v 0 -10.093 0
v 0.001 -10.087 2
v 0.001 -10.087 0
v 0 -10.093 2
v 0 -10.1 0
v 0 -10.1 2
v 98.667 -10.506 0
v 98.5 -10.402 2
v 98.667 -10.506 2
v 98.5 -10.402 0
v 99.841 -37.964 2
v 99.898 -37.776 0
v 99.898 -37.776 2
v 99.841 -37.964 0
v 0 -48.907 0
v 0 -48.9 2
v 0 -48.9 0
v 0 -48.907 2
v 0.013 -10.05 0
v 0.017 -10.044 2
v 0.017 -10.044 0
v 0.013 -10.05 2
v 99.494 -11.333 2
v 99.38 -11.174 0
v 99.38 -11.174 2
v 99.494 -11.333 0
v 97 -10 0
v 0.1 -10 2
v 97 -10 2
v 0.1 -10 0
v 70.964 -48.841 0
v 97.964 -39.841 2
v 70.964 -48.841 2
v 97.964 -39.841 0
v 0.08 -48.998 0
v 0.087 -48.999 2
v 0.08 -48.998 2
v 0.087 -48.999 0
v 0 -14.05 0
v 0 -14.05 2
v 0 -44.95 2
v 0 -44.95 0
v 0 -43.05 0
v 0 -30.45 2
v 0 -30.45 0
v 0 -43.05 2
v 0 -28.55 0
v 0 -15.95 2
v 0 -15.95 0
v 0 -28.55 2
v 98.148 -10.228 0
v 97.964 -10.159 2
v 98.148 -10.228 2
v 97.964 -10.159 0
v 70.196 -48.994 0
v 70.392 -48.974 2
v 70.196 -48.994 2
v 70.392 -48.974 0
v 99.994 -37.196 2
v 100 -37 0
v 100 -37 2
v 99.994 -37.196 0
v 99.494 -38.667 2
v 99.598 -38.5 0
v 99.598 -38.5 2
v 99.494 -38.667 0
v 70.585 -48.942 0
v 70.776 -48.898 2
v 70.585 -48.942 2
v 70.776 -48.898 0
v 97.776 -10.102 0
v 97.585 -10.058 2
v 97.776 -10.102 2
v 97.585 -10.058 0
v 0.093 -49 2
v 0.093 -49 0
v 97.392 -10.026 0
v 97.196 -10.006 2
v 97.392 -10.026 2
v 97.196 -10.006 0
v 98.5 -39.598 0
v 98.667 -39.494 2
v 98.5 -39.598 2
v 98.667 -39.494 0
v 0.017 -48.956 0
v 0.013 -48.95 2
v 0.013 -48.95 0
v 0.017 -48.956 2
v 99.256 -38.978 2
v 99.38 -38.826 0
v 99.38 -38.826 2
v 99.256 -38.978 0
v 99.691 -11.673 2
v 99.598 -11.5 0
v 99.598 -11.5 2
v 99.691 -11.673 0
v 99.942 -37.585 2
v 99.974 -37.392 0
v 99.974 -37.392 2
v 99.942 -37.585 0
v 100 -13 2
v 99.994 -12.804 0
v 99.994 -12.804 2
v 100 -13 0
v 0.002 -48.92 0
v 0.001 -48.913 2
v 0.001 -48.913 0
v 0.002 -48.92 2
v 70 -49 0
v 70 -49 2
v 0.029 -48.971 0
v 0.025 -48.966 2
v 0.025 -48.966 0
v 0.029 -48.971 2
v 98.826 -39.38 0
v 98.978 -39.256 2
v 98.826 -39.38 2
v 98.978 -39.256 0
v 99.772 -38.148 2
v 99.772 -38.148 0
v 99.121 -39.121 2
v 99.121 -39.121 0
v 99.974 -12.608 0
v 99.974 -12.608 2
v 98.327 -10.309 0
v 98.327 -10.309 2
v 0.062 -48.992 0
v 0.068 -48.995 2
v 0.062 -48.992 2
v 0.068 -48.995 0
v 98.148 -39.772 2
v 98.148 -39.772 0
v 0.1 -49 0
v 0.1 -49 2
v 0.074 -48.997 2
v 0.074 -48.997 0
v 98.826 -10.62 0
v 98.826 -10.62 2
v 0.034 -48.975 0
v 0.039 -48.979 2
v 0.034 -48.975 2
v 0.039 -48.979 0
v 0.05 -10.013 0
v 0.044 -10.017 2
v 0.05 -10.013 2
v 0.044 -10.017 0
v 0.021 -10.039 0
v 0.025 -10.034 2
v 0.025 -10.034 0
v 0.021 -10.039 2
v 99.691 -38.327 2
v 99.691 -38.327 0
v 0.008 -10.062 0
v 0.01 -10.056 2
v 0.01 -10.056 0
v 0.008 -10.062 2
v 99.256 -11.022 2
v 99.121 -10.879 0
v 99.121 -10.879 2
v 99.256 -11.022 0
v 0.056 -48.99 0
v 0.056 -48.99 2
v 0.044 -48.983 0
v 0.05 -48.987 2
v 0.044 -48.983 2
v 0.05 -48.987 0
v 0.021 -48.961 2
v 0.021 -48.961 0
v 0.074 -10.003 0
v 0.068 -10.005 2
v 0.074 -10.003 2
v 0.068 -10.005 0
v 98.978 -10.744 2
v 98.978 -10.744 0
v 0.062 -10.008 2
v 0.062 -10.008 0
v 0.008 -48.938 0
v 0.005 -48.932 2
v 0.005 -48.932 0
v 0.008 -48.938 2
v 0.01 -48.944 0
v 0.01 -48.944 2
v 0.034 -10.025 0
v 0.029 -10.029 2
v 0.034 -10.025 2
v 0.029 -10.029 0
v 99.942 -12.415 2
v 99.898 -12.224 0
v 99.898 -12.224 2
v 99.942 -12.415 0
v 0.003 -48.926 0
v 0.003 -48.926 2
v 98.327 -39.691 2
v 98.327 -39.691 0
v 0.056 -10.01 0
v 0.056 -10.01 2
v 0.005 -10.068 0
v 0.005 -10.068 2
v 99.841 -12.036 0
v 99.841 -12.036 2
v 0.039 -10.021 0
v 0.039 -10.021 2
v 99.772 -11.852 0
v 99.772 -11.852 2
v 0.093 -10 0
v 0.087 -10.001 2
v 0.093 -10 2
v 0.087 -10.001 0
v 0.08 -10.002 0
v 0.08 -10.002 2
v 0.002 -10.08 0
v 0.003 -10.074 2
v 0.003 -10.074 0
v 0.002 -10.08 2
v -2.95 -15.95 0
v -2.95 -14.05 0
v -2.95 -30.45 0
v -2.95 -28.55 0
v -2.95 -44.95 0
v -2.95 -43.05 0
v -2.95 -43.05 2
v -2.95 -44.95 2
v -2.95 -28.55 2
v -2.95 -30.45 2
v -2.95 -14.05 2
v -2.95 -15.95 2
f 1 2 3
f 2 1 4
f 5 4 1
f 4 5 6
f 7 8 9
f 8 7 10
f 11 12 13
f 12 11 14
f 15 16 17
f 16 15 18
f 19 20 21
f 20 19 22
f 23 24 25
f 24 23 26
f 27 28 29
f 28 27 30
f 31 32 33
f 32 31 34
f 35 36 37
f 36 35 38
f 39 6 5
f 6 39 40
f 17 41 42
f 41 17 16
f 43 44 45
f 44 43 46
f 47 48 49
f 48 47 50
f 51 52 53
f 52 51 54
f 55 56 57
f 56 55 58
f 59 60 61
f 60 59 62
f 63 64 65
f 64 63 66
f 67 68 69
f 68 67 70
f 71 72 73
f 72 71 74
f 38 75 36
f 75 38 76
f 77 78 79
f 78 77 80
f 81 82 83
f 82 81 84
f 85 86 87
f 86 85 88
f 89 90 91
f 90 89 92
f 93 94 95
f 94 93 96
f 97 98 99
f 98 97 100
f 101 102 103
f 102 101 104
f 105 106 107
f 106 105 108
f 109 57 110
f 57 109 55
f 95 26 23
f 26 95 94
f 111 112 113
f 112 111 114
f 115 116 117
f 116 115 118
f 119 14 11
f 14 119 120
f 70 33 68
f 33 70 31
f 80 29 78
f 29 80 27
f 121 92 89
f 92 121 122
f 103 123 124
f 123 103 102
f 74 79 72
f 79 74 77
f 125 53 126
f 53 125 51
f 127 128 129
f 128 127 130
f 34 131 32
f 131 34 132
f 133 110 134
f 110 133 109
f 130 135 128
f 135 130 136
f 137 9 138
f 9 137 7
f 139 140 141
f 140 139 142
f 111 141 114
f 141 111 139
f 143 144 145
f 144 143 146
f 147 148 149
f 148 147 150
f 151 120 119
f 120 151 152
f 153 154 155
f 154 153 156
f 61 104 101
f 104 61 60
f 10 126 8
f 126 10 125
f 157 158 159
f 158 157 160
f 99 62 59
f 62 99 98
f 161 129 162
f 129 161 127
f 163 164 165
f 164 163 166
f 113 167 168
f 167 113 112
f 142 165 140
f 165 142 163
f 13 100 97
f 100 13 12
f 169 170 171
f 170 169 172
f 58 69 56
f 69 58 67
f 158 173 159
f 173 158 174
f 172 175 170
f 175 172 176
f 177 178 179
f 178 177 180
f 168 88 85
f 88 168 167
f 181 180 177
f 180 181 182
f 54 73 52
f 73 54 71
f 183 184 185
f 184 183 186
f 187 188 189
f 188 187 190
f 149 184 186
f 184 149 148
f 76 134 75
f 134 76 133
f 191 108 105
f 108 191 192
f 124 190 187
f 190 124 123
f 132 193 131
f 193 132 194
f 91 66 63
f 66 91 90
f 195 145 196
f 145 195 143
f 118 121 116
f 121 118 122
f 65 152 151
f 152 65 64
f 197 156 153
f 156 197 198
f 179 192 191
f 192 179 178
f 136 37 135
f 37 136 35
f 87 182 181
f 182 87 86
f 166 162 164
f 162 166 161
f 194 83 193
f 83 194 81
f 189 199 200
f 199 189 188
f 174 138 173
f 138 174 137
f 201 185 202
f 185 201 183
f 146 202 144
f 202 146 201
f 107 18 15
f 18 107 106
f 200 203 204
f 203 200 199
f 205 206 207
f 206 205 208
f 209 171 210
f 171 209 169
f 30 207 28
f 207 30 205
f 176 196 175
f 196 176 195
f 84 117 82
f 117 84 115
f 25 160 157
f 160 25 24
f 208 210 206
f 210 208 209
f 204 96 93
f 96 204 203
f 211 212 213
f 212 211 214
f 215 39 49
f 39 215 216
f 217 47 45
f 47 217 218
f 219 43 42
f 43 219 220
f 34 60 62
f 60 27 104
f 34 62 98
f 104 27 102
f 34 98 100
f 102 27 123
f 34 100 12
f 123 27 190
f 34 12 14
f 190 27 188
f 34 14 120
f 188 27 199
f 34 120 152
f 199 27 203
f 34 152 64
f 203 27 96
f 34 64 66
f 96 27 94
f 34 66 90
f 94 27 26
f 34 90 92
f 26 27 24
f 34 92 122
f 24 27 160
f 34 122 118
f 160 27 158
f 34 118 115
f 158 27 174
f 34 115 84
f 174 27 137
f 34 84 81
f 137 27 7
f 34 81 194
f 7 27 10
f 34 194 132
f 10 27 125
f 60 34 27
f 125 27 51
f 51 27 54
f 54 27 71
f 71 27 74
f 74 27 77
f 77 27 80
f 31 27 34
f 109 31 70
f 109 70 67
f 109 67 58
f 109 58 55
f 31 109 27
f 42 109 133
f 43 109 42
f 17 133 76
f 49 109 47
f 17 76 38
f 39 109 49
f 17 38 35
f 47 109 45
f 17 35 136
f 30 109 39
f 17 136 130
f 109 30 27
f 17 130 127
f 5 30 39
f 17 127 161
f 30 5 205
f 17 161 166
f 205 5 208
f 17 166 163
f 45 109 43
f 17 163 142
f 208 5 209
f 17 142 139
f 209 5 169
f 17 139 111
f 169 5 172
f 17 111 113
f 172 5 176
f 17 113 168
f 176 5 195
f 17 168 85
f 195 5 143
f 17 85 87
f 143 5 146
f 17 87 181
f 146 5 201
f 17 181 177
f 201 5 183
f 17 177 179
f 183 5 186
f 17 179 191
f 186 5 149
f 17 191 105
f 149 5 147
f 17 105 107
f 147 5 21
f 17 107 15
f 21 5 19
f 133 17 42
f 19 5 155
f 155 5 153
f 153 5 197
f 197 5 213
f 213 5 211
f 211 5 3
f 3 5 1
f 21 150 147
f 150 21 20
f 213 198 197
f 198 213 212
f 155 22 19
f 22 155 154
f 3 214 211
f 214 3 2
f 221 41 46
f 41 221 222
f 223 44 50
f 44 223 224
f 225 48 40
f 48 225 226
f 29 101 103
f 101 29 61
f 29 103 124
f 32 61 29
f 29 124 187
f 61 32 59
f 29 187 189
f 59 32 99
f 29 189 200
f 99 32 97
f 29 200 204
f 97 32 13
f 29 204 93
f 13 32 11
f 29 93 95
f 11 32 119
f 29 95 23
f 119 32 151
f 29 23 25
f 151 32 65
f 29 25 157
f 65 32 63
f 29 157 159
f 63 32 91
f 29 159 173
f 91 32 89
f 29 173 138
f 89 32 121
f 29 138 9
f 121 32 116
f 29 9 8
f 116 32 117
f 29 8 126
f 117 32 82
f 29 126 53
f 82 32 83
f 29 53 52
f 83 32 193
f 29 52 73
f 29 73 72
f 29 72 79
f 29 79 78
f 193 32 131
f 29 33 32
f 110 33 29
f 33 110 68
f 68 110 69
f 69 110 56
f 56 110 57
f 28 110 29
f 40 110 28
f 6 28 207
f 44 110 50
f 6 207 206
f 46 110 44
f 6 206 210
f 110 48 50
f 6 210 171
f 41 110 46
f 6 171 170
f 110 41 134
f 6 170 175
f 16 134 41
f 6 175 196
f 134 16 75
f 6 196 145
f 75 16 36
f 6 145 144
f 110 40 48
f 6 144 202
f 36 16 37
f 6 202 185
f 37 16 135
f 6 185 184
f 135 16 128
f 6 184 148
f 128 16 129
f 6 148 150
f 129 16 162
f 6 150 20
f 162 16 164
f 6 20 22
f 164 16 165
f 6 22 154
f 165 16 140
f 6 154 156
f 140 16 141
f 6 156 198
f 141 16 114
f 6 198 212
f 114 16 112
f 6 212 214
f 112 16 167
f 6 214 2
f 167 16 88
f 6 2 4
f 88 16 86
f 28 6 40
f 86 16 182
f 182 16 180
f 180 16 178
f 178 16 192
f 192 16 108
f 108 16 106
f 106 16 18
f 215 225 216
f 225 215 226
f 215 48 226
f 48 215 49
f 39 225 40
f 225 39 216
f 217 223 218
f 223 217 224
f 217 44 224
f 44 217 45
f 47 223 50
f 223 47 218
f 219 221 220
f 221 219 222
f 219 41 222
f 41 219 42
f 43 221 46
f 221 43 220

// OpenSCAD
// file: wings-common.scad
// Simple glider.

// Copyright (C) 2015 Embecosm Limited (www.embecosm.com)

// Contributor: Jeremy Bennett <jeremy.bennett@embecosm.com>

// This file is licensed under the Creative Commons Attribution-ShareAlike 3.0
// Unported License. To view a copy of this license, visit
// http://creativecommons.org/licenses/by-sa/3.0/ or send a letter to Creative
// Commons, PO Box 1866, Mountain View, CA 94042, USA.


// A very simple hand thrown glider for indoor use.

// This is the common parts of the wings.  Print with very low fill density in
// something like HIPS for low weight.


// Useful constants
corner_r =   3;
micro_r  =   0.1;
wing_z   =   2;
max_x    = 100;
min_x    =  70;
max_y    =  39;
min_y    =  30;

// Constants for the pegs. Note that the length is sum of peg *and* hole
// length.
gap = 0.1;
peg_len = 3 * 2;

// Smooth corners
$fn      = 96;

// 2D outline, which we'll later extrude.
module wing_2d () {
    hull () {
        translate (v = [micro_r, micro_r, 0])
            circle (r = micro_r);
        translate (v = [max_x - corner_r, corner_r, 0])
            circle (r = corner_r);
        translate (v = [max_x - corner_r, min_y - corner_r, 0])
            circle (r = corner_r);
        translate (v = [min_x, max_y - corner_r, 0])
            circle (r = corner_r);
        translate (v = [micro_r, max_y - micro_r, 0])
            circle (r = micro_r);
    }
}


// 3D wing
module wing_3d () {
    translate (v = [0, 10, 0])
        linear_extrude (height = wing_z, slices = 1, convexity = 1)
            wing_2d ();
}
// main file
// Simple glider.

// Copyright (C) 2015 Embecosm Limited (www.embecosm.com)

// Contributor: Jeremy Bennett <jeremy.bennett@embecosm.com>

// This file is licensed under the Creative Commons Attribution-ShareAlike 3.0
// Unported License. To view a copy of this license, visit
// http://creativecommons.org/licenses/by-sa/3.0/ or send a letter to Creative
// Commons, PO Box 1866, Mountain View, CA 94042, USA.


// A very simple hand thrown glider for indoor use.

// This is the left wing.  Print with very low fill density in something like
// HIPS for low weight.

include <wings-common.scad>


// Sockets to join together
module wing_left () {
    mirror ([0, 1, 0])
        union () {
            wing_3d ();
            translate (v = [0, 10 + 5, wing_z / 2])
                cube (size = [peg_len - gap, wing_z - gap, wing_z], center = true);
            translate (v = [0, 10 + max_y / 2, wing_z / 2])
                cube (size = [peg_len - gap, wing_z - gap, wing_z], center = true);
            translate (v = [0, 10 + max_y - 5, wing_z / 2])
                cube (size = [peg_len - gap, wing_z - gap, wing_z], center = true);
        }
}


wing_left ();
